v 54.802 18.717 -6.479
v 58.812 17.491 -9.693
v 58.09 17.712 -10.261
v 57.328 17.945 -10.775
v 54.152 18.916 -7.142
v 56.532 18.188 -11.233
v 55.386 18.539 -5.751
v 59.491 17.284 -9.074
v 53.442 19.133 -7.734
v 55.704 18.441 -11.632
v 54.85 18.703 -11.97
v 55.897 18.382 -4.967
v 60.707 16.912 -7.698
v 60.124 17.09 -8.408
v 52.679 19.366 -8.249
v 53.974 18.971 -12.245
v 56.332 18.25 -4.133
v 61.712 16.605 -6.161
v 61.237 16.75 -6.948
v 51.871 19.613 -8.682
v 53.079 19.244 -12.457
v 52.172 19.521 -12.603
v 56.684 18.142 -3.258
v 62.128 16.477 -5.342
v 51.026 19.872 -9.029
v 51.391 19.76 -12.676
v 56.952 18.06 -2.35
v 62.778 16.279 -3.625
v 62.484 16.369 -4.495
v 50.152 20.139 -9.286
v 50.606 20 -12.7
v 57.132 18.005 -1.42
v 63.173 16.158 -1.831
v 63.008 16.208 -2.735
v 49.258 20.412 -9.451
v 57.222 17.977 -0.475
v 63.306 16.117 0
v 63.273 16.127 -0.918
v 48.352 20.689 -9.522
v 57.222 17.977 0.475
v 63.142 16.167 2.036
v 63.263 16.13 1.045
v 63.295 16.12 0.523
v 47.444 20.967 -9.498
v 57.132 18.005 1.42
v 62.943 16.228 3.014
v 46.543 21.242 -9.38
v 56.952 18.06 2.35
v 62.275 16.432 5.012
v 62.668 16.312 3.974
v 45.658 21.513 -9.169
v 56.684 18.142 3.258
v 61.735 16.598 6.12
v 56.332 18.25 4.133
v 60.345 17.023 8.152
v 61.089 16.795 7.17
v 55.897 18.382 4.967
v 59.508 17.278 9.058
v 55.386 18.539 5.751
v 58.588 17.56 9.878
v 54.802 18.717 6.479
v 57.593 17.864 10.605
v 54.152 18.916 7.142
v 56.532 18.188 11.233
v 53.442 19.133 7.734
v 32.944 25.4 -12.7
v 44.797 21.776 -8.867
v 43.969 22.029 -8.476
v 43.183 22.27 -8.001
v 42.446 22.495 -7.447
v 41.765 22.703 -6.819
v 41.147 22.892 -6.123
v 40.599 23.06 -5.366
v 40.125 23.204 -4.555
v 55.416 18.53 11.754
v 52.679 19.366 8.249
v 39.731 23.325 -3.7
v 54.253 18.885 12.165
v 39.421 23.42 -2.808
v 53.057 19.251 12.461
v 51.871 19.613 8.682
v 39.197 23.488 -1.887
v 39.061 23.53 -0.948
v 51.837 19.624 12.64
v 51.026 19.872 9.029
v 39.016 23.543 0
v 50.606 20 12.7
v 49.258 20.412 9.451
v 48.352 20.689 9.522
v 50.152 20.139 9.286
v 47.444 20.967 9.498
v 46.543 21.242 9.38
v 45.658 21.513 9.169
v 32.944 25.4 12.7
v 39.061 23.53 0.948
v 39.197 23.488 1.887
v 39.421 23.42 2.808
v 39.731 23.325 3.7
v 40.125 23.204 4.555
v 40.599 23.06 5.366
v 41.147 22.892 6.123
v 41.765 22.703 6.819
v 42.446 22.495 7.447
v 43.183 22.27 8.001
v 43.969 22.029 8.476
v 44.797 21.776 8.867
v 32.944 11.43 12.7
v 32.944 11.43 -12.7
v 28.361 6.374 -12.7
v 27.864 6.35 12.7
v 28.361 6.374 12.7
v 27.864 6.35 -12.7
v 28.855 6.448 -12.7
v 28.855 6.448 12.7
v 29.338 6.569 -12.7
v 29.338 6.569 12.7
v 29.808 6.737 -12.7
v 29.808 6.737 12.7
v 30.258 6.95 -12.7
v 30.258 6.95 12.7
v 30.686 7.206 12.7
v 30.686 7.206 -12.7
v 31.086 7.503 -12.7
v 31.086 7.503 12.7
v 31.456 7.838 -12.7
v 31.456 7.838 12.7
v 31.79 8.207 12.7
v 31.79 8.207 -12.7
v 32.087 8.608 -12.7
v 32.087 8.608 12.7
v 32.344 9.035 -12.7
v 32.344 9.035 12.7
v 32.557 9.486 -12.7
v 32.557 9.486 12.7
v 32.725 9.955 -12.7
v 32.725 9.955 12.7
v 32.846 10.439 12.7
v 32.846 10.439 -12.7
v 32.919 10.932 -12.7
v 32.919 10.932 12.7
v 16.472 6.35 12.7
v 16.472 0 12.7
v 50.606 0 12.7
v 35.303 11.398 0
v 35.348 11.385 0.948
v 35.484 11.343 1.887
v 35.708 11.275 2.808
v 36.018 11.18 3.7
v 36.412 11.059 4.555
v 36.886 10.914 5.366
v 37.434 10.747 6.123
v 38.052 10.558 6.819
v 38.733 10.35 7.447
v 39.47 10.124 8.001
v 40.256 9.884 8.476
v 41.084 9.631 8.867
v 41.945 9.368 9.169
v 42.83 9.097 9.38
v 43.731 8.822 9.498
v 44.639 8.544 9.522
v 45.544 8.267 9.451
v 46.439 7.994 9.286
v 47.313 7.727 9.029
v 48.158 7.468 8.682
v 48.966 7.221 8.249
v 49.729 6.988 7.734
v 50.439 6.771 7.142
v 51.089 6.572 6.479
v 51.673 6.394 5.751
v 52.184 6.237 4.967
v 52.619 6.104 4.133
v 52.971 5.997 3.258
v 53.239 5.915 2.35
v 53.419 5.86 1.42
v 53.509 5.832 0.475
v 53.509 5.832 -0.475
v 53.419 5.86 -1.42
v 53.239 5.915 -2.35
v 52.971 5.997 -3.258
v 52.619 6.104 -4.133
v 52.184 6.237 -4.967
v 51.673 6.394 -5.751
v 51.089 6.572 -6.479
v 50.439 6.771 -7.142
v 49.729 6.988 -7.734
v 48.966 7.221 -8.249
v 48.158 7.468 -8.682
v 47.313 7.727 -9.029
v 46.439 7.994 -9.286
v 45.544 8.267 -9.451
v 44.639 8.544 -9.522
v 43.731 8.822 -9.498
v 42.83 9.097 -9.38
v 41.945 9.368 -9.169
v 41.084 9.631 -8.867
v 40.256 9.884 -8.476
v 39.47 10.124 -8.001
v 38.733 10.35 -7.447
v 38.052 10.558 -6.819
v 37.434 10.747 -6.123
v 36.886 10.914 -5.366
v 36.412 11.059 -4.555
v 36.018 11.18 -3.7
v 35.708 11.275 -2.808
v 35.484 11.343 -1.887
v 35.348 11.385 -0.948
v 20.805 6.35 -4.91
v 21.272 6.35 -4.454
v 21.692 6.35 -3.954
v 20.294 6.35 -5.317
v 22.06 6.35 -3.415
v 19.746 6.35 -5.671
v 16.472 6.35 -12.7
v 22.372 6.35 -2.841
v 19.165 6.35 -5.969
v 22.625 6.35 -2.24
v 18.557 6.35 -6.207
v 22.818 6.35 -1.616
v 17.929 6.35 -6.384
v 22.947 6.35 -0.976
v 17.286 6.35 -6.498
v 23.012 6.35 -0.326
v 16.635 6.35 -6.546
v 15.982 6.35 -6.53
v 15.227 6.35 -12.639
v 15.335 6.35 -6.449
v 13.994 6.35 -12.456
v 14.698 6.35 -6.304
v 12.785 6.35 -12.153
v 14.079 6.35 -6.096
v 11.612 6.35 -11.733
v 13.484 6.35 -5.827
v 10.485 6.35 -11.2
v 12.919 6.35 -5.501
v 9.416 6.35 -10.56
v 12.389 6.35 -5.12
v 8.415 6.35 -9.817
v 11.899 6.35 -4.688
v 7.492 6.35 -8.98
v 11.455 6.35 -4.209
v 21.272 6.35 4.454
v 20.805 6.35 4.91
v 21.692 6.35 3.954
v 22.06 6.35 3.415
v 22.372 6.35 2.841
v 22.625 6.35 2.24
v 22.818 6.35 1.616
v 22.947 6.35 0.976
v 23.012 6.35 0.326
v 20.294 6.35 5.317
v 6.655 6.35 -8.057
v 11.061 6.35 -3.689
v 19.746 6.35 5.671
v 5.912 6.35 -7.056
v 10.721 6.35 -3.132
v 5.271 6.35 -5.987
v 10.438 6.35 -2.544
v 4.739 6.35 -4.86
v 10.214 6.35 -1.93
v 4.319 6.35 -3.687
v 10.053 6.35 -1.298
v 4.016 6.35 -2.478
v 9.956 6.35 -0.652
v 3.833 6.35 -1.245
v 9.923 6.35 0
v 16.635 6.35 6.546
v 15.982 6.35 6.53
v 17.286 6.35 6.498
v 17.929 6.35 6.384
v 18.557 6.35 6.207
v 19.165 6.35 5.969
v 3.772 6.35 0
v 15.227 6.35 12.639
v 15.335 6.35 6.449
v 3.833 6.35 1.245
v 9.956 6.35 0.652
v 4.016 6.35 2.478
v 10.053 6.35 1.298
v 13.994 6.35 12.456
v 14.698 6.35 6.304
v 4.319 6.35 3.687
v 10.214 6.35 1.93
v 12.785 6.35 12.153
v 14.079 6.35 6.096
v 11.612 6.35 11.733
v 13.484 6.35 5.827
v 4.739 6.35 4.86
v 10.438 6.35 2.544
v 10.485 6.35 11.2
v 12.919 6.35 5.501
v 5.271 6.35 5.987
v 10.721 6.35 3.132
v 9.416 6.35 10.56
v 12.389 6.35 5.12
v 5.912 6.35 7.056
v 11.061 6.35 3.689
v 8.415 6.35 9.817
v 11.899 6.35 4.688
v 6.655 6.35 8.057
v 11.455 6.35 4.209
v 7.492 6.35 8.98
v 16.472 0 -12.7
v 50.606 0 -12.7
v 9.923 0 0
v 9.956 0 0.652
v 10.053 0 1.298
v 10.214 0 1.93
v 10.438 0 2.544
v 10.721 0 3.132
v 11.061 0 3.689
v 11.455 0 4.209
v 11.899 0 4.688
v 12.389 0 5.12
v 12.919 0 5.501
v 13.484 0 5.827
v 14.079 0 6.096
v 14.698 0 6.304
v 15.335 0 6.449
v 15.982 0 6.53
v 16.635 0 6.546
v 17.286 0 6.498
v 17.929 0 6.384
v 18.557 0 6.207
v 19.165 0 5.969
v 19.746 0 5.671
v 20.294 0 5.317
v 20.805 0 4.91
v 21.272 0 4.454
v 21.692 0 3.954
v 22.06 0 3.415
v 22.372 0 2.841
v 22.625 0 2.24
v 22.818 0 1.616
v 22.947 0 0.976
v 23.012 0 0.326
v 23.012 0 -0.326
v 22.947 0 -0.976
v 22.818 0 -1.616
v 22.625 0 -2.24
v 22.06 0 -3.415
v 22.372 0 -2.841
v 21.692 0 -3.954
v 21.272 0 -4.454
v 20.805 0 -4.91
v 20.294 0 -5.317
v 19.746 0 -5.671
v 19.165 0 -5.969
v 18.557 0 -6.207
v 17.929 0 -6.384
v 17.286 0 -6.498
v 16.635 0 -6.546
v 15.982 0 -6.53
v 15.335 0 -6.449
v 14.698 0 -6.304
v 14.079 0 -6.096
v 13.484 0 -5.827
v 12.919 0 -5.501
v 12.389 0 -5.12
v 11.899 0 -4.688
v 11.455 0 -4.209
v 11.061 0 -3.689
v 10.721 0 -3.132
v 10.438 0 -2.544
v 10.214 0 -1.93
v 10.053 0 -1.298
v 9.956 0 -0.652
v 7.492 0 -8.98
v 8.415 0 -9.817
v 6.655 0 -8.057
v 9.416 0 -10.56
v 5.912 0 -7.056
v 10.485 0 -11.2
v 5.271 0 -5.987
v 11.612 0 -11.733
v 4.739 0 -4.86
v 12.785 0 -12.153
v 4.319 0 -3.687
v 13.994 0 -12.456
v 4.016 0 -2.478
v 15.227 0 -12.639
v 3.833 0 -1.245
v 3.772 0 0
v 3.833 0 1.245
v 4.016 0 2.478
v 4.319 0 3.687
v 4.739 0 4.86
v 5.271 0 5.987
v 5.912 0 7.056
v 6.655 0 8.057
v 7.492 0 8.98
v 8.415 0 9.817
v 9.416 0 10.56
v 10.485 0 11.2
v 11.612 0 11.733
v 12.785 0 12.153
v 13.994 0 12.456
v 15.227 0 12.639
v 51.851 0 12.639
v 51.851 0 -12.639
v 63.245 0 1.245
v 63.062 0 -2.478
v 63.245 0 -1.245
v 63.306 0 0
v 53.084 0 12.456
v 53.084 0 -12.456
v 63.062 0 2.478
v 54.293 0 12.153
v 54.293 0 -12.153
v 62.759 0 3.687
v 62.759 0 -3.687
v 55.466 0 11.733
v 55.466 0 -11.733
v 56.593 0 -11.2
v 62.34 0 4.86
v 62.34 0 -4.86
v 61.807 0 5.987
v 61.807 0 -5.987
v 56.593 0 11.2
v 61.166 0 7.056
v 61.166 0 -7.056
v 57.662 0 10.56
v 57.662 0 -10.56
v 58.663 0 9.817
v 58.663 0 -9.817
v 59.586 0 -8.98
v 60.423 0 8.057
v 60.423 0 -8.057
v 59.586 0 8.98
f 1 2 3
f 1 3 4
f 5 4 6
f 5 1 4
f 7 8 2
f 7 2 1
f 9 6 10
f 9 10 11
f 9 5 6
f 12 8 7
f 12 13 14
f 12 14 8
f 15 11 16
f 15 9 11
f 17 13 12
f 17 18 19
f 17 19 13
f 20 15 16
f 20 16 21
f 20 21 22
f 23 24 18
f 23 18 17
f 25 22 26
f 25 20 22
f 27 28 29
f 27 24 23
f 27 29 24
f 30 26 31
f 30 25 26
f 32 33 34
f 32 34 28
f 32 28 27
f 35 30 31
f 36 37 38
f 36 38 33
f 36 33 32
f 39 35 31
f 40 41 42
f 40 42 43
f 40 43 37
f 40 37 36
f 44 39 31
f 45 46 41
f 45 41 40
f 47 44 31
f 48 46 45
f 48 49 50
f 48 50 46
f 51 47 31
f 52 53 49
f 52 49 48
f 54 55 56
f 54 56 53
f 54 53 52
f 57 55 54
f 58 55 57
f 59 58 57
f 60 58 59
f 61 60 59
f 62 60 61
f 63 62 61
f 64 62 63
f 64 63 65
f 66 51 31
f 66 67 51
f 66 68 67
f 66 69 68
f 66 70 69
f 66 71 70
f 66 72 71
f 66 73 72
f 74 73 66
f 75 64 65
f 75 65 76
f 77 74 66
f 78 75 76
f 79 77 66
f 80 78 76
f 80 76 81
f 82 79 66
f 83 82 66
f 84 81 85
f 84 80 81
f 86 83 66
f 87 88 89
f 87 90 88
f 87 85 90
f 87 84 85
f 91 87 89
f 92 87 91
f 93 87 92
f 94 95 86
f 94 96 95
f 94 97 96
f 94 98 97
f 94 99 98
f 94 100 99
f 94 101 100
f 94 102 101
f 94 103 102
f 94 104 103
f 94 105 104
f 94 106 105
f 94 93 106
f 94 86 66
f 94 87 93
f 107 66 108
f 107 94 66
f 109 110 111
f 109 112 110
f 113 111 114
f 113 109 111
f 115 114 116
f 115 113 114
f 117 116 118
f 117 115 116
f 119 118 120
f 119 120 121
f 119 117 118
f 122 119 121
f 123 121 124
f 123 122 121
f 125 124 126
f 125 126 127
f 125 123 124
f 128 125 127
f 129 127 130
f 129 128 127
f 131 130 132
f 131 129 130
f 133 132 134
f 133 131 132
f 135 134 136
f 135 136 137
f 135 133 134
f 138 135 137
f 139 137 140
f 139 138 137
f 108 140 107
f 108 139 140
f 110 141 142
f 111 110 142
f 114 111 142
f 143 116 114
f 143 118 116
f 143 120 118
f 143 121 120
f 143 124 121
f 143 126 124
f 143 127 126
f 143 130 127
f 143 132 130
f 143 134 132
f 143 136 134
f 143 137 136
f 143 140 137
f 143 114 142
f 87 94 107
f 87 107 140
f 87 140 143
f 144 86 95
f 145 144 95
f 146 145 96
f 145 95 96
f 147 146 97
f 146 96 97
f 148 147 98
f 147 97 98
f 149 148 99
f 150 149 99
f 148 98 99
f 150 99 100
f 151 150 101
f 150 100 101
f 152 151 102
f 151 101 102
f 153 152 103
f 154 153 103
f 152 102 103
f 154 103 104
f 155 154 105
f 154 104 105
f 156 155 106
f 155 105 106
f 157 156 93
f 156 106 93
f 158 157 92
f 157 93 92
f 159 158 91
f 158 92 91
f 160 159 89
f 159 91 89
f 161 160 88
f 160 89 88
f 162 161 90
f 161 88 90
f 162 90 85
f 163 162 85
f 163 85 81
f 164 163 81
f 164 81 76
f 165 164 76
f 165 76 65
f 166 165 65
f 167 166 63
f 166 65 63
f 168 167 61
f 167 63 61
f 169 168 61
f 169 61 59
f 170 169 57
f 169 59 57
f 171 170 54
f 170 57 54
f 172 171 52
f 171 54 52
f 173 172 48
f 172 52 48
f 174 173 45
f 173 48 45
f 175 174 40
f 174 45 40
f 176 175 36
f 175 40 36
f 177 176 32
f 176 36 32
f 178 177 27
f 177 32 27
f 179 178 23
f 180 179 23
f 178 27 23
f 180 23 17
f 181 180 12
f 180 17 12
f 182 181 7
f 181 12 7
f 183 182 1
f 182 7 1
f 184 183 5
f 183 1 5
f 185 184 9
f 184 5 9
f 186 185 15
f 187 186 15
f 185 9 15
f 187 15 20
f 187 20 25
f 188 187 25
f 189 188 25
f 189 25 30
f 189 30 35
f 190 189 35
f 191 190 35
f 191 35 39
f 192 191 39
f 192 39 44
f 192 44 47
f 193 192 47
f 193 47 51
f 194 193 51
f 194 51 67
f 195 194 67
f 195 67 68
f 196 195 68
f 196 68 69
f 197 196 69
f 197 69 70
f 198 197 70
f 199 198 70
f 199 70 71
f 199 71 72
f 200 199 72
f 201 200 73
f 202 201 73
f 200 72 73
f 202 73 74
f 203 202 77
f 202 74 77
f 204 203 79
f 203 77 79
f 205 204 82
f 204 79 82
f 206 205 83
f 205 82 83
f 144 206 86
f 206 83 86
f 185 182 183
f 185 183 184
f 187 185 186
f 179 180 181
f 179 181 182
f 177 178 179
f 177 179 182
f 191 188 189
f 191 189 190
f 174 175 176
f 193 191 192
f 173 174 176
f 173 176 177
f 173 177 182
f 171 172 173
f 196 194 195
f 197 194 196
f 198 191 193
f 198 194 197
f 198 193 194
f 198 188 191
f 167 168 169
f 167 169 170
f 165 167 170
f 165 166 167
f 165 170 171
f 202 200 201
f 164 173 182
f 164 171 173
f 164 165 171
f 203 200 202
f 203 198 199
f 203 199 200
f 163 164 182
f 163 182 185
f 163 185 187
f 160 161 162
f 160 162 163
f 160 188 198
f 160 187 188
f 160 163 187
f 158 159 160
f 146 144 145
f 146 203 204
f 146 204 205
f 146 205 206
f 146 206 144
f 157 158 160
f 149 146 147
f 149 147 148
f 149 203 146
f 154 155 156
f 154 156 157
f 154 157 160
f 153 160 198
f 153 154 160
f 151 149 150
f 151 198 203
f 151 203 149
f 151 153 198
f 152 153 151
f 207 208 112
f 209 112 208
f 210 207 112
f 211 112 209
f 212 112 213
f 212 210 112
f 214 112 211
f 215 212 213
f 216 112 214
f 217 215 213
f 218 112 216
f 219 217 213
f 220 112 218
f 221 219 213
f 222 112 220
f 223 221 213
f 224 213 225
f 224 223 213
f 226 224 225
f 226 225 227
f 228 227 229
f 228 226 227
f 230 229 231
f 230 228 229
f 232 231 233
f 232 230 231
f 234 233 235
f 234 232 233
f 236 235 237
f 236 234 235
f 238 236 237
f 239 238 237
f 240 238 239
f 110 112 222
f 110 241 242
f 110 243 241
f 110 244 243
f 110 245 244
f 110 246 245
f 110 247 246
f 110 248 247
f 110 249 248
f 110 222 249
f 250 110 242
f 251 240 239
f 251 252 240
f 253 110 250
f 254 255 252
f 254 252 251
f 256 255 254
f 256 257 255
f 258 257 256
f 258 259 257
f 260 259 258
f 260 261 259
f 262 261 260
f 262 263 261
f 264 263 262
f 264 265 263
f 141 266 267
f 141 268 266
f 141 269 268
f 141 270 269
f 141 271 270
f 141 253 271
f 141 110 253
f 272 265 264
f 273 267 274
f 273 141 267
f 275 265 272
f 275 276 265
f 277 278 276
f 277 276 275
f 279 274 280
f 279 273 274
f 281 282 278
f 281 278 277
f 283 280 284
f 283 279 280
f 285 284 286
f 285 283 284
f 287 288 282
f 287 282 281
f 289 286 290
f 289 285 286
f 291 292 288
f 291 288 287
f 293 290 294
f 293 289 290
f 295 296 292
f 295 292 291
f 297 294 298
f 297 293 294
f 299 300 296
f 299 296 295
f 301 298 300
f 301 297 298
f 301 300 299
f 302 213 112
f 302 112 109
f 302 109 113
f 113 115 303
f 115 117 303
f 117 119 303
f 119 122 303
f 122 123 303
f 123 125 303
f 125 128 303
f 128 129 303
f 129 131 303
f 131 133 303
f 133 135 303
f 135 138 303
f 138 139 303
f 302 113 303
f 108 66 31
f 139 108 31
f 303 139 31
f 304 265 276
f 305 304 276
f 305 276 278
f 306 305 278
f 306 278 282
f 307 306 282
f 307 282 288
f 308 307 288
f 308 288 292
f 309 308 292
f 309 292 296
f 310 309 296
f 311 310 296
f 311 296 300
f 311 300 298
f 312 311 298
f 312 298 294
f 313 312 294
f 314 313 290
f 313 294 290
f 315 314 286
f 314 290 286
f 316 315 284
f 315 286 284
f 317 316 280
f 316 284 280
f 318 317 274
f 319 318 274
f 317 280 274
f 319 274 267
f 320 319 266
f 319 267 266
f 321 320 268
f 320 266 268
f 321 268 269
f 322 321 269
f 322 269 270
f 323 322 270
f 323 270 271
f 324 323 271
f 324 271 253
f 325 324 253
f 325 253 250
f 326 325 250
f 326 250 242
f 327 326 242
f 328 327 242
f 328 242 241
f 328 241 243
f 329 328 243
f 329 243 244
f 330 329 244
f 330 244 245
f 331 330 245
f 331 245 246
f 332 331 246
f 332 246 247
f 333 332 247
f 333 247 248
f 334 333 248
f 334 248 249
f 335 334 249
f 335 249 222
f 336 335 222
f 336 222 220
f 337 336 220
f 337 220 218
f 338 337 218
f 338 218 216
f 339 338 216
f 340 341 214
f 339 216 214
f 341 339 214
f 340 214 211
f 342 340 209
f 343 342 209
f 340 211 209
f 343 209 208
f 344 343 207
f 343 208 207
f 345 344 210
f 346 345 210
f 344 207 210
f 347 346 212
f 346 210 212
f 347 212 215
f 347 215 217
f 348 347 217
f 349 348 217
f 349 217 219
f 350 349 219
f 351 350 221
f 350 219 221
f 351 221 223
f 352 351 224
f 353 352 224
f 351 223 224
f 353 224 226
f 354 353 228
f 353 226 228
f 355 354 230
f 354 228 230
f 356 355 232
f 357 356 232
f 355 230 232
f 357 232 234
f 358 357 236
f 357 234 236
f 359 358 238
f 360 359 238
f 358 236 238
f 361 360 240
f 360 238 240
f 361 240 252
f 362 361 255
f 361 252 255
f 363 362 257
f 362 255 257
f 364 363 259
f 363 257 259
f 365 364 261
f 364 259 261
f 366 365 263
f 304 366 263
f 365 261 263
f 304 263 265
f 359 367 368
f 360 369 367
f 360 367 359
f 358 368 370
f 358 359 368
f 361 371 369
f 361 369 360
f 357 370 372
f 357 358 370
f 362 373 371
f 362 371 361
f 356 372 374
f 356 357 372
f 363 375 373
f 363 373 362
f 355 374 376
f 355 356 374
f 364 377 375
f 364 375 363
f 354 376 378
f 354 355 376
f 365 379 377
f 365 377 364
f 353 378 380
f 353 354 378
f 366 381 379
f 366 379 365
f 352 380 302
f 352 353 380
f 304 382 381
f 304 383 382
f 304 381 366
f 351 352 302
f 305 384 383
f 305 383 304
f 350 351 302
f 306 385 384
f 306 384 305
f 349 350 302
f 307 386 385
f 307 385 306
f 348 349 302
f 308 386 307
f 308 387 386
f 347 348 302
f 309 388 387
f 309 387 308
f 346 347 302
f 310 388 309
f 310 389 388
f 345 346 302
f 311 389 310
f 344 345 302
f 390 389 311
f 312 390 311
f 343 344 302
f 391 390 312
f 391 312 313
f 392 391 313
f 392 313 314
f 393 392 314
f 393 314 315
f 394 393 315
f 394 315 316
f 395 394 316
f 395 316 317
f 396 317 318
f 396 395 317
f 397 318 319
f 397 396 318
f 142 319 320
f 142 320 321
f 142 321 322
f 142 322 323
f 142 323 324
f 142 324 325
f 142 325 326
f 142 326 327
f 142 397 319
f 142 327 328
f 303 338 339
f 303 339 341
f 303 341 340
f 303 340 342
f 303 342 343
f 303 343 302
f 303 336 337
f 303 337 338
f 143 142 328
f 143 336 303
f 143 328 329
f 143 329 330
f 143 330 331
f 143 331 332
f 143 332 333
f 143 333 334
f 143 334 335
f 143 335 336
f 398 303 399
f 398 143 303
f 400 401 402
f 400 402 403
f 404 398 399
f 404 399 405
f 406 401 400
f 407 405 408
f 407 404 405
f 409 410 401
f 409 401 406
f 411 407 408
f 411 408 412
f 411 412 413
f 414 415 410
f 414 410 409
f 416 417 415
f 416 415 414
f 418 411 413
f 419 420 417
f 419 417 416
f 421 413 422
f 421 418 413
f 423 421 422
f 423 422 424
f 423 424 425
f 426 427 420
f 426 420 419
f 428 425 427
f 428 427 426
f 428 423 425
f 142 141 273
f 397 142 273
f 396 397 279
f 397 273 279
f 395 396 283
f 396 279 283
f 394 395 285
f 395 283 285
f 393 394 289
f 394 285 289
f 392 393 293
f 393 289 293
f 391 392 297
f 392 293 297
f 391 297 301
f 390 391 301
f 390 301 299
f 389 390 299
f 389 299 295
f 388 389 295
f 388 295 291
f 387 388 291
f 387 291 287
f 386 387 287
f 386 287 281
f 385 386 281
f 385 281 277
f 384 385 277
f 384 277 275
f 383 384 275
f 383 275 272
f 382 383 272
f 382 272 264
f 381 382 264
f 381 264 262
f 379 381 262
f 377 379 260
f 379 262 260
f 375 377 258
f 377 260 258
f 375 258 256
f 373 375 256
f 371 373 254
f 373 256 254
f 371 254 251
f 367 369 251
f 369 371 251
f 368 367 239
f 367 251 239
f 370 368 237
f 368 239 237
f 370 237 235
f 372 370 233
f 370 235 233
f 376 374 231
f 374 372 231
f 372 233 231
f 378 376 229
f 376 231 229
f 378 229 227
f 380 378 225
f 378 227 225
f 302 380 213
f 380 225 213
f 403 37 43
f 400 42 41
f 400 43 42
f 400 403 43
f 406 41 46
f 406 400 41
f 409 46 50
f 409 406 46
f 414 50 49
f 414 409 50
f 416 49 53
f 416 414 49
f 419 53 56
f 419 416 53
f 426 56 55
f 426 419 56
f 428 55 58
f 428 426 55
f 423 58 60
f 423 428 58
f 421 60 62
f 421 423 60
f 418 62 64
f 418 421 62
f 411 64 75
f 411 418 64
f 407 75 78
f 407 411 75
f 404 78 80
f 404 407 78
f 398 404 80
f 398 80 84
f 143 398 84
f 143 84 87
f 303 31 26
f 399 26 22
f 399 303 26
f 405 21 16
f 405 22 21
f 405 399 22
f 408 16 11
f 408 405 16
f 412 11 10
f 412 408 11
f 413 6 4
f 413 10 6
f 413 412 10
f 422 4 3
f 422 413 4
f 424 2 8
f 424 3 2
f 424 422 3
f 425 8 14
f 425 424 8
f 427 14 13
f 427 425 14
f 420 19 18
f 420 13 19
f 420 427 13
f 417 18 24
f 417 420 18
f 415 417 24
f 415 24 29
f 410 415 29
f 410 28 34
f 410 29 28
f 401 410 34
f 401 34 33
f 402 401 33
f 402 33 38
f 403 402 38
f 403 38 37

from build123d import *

# Parameters (mm, degrees)
BOSS_EXTRUDE1_DEPTH = 12.7
SKETCH2_R           = 9.525
CUT_EXTRUDE1_DEPTH  = 12.7
SKETCH3_R           = 6.5484375
CUT_EXTRUDE2_DEPTH  = 68.319185137
FILLET3_START       = -1
FILLET3_DEPTH       = 26.4
CUT_EXTRUDE3_DEPTH  = 68.319185137
FILLET4_R           = 5.08


with BuildPart() as part:
    # Sketch1 → Boss-Extrude1 (new, symmetric)
    with BuildSketch(Plane.XY):
        Polygon((0, 0), (63.3062413, 0), (63.3062413, 16.117198375), (32.943565298, 25.4), (32.943565298, 6.35), (0, 6.35), align=None)
    extrude(amount=BOSS_EXTRUDE1_DEPTH, both=True)

    # Sketch2 → Cut-Extrude1 (cut)
    with BuildSketch(Plane(origin=(9.91780582, 32.439681136, 0), x_dir=(0.9563047559630374, -0.29237170472273033, 0), z_dir=(0.29237170472273033, 0.9563047559630374, 0))):
        with Locations(Location((39.952846873, 0, 0), (0, 0, 180))):
            Circle(SKETCH2_R)
    extrude(amount=-CUT_EXTRUDE1_DEPTH, mode=Mode.SUBTRACT)

    # Sketch3 → Cut-Extrude2 (cut, through all)
    with BuildSketch(Plane(origin=(0, 6.35, 0), x_dir=(1, 0, 0), z_dir=(0, 1, 0))):
        with Locations(Location((16.471782649, 0, 0), (0, 0, 180))):
            Circle(SKETCH3_R)
    extrude(amount=-CUT_EXTRUDE2_DEPTH, mode=Mode.SUBTRACT)

    # Fillet3: read off the stored shape, not the designer's step
    # Fillet3 outline → Fillet3 (cut)
    with BuildSketch(Plane(origin=(0, 0, 0), x_dir=(1, 0, 0), z_dir=(0, 1, 0)).offset(FILLET3_START)):
        with BuildLine():
            ThreePointArc((50.6062413, 12.7), (59.586497421, 8.980256121), (63.3062413, 0))
            Line((63.3062413, 0), (63.3062413, 12.7))
            Line((63.3062413, 12.7), (50.6062413, 12.7))
        make_face()
        with BuildLine():
            ThreePointArc((63.3062413, 0), (59.586497421, -8.980256121), (50.6062413, -12.7))
            Line((50.6062413, -12.7), (63.3062413, -12.7))
            Line((63.3062413, -12.7), (63.3062413, 0))
        make_face()
    extrude(amount=FILLET3_DEPTH, mode=Mode.SUBTRACT)

    # Sketch4 → Cut-Extrude3 (cut, through all)
    with BuildSketch(Plane(origin=(0, 6.35, 0), x_dir=(1, 0, 0), z_dir=(0, 1, 0))):
        with BuildLine():
            Line((16.471782649, 12.7), (0, 12.7))
            Line((0, 12.7), (0, -12.7))
            Line((0, -12.7), (16.471782649, -12.7))
            ThreePointArc((16.471782649, -12.7), (3.771782649, 0), (16.471782649, 12.7))
        make_face()
    extrude(amount=-CUT_EXTRUDE3_DEPTH, mode=Mode.SUBTRACT)

    # Fillet4
    fillet4_edges = [part.edges().sort_by_distance(p)[0] for p in [
        (32.943565298, 6.35, 0),
    ]]
    fillet(fillet4_edges, radius=FILLET4_R)


solid = part.part
